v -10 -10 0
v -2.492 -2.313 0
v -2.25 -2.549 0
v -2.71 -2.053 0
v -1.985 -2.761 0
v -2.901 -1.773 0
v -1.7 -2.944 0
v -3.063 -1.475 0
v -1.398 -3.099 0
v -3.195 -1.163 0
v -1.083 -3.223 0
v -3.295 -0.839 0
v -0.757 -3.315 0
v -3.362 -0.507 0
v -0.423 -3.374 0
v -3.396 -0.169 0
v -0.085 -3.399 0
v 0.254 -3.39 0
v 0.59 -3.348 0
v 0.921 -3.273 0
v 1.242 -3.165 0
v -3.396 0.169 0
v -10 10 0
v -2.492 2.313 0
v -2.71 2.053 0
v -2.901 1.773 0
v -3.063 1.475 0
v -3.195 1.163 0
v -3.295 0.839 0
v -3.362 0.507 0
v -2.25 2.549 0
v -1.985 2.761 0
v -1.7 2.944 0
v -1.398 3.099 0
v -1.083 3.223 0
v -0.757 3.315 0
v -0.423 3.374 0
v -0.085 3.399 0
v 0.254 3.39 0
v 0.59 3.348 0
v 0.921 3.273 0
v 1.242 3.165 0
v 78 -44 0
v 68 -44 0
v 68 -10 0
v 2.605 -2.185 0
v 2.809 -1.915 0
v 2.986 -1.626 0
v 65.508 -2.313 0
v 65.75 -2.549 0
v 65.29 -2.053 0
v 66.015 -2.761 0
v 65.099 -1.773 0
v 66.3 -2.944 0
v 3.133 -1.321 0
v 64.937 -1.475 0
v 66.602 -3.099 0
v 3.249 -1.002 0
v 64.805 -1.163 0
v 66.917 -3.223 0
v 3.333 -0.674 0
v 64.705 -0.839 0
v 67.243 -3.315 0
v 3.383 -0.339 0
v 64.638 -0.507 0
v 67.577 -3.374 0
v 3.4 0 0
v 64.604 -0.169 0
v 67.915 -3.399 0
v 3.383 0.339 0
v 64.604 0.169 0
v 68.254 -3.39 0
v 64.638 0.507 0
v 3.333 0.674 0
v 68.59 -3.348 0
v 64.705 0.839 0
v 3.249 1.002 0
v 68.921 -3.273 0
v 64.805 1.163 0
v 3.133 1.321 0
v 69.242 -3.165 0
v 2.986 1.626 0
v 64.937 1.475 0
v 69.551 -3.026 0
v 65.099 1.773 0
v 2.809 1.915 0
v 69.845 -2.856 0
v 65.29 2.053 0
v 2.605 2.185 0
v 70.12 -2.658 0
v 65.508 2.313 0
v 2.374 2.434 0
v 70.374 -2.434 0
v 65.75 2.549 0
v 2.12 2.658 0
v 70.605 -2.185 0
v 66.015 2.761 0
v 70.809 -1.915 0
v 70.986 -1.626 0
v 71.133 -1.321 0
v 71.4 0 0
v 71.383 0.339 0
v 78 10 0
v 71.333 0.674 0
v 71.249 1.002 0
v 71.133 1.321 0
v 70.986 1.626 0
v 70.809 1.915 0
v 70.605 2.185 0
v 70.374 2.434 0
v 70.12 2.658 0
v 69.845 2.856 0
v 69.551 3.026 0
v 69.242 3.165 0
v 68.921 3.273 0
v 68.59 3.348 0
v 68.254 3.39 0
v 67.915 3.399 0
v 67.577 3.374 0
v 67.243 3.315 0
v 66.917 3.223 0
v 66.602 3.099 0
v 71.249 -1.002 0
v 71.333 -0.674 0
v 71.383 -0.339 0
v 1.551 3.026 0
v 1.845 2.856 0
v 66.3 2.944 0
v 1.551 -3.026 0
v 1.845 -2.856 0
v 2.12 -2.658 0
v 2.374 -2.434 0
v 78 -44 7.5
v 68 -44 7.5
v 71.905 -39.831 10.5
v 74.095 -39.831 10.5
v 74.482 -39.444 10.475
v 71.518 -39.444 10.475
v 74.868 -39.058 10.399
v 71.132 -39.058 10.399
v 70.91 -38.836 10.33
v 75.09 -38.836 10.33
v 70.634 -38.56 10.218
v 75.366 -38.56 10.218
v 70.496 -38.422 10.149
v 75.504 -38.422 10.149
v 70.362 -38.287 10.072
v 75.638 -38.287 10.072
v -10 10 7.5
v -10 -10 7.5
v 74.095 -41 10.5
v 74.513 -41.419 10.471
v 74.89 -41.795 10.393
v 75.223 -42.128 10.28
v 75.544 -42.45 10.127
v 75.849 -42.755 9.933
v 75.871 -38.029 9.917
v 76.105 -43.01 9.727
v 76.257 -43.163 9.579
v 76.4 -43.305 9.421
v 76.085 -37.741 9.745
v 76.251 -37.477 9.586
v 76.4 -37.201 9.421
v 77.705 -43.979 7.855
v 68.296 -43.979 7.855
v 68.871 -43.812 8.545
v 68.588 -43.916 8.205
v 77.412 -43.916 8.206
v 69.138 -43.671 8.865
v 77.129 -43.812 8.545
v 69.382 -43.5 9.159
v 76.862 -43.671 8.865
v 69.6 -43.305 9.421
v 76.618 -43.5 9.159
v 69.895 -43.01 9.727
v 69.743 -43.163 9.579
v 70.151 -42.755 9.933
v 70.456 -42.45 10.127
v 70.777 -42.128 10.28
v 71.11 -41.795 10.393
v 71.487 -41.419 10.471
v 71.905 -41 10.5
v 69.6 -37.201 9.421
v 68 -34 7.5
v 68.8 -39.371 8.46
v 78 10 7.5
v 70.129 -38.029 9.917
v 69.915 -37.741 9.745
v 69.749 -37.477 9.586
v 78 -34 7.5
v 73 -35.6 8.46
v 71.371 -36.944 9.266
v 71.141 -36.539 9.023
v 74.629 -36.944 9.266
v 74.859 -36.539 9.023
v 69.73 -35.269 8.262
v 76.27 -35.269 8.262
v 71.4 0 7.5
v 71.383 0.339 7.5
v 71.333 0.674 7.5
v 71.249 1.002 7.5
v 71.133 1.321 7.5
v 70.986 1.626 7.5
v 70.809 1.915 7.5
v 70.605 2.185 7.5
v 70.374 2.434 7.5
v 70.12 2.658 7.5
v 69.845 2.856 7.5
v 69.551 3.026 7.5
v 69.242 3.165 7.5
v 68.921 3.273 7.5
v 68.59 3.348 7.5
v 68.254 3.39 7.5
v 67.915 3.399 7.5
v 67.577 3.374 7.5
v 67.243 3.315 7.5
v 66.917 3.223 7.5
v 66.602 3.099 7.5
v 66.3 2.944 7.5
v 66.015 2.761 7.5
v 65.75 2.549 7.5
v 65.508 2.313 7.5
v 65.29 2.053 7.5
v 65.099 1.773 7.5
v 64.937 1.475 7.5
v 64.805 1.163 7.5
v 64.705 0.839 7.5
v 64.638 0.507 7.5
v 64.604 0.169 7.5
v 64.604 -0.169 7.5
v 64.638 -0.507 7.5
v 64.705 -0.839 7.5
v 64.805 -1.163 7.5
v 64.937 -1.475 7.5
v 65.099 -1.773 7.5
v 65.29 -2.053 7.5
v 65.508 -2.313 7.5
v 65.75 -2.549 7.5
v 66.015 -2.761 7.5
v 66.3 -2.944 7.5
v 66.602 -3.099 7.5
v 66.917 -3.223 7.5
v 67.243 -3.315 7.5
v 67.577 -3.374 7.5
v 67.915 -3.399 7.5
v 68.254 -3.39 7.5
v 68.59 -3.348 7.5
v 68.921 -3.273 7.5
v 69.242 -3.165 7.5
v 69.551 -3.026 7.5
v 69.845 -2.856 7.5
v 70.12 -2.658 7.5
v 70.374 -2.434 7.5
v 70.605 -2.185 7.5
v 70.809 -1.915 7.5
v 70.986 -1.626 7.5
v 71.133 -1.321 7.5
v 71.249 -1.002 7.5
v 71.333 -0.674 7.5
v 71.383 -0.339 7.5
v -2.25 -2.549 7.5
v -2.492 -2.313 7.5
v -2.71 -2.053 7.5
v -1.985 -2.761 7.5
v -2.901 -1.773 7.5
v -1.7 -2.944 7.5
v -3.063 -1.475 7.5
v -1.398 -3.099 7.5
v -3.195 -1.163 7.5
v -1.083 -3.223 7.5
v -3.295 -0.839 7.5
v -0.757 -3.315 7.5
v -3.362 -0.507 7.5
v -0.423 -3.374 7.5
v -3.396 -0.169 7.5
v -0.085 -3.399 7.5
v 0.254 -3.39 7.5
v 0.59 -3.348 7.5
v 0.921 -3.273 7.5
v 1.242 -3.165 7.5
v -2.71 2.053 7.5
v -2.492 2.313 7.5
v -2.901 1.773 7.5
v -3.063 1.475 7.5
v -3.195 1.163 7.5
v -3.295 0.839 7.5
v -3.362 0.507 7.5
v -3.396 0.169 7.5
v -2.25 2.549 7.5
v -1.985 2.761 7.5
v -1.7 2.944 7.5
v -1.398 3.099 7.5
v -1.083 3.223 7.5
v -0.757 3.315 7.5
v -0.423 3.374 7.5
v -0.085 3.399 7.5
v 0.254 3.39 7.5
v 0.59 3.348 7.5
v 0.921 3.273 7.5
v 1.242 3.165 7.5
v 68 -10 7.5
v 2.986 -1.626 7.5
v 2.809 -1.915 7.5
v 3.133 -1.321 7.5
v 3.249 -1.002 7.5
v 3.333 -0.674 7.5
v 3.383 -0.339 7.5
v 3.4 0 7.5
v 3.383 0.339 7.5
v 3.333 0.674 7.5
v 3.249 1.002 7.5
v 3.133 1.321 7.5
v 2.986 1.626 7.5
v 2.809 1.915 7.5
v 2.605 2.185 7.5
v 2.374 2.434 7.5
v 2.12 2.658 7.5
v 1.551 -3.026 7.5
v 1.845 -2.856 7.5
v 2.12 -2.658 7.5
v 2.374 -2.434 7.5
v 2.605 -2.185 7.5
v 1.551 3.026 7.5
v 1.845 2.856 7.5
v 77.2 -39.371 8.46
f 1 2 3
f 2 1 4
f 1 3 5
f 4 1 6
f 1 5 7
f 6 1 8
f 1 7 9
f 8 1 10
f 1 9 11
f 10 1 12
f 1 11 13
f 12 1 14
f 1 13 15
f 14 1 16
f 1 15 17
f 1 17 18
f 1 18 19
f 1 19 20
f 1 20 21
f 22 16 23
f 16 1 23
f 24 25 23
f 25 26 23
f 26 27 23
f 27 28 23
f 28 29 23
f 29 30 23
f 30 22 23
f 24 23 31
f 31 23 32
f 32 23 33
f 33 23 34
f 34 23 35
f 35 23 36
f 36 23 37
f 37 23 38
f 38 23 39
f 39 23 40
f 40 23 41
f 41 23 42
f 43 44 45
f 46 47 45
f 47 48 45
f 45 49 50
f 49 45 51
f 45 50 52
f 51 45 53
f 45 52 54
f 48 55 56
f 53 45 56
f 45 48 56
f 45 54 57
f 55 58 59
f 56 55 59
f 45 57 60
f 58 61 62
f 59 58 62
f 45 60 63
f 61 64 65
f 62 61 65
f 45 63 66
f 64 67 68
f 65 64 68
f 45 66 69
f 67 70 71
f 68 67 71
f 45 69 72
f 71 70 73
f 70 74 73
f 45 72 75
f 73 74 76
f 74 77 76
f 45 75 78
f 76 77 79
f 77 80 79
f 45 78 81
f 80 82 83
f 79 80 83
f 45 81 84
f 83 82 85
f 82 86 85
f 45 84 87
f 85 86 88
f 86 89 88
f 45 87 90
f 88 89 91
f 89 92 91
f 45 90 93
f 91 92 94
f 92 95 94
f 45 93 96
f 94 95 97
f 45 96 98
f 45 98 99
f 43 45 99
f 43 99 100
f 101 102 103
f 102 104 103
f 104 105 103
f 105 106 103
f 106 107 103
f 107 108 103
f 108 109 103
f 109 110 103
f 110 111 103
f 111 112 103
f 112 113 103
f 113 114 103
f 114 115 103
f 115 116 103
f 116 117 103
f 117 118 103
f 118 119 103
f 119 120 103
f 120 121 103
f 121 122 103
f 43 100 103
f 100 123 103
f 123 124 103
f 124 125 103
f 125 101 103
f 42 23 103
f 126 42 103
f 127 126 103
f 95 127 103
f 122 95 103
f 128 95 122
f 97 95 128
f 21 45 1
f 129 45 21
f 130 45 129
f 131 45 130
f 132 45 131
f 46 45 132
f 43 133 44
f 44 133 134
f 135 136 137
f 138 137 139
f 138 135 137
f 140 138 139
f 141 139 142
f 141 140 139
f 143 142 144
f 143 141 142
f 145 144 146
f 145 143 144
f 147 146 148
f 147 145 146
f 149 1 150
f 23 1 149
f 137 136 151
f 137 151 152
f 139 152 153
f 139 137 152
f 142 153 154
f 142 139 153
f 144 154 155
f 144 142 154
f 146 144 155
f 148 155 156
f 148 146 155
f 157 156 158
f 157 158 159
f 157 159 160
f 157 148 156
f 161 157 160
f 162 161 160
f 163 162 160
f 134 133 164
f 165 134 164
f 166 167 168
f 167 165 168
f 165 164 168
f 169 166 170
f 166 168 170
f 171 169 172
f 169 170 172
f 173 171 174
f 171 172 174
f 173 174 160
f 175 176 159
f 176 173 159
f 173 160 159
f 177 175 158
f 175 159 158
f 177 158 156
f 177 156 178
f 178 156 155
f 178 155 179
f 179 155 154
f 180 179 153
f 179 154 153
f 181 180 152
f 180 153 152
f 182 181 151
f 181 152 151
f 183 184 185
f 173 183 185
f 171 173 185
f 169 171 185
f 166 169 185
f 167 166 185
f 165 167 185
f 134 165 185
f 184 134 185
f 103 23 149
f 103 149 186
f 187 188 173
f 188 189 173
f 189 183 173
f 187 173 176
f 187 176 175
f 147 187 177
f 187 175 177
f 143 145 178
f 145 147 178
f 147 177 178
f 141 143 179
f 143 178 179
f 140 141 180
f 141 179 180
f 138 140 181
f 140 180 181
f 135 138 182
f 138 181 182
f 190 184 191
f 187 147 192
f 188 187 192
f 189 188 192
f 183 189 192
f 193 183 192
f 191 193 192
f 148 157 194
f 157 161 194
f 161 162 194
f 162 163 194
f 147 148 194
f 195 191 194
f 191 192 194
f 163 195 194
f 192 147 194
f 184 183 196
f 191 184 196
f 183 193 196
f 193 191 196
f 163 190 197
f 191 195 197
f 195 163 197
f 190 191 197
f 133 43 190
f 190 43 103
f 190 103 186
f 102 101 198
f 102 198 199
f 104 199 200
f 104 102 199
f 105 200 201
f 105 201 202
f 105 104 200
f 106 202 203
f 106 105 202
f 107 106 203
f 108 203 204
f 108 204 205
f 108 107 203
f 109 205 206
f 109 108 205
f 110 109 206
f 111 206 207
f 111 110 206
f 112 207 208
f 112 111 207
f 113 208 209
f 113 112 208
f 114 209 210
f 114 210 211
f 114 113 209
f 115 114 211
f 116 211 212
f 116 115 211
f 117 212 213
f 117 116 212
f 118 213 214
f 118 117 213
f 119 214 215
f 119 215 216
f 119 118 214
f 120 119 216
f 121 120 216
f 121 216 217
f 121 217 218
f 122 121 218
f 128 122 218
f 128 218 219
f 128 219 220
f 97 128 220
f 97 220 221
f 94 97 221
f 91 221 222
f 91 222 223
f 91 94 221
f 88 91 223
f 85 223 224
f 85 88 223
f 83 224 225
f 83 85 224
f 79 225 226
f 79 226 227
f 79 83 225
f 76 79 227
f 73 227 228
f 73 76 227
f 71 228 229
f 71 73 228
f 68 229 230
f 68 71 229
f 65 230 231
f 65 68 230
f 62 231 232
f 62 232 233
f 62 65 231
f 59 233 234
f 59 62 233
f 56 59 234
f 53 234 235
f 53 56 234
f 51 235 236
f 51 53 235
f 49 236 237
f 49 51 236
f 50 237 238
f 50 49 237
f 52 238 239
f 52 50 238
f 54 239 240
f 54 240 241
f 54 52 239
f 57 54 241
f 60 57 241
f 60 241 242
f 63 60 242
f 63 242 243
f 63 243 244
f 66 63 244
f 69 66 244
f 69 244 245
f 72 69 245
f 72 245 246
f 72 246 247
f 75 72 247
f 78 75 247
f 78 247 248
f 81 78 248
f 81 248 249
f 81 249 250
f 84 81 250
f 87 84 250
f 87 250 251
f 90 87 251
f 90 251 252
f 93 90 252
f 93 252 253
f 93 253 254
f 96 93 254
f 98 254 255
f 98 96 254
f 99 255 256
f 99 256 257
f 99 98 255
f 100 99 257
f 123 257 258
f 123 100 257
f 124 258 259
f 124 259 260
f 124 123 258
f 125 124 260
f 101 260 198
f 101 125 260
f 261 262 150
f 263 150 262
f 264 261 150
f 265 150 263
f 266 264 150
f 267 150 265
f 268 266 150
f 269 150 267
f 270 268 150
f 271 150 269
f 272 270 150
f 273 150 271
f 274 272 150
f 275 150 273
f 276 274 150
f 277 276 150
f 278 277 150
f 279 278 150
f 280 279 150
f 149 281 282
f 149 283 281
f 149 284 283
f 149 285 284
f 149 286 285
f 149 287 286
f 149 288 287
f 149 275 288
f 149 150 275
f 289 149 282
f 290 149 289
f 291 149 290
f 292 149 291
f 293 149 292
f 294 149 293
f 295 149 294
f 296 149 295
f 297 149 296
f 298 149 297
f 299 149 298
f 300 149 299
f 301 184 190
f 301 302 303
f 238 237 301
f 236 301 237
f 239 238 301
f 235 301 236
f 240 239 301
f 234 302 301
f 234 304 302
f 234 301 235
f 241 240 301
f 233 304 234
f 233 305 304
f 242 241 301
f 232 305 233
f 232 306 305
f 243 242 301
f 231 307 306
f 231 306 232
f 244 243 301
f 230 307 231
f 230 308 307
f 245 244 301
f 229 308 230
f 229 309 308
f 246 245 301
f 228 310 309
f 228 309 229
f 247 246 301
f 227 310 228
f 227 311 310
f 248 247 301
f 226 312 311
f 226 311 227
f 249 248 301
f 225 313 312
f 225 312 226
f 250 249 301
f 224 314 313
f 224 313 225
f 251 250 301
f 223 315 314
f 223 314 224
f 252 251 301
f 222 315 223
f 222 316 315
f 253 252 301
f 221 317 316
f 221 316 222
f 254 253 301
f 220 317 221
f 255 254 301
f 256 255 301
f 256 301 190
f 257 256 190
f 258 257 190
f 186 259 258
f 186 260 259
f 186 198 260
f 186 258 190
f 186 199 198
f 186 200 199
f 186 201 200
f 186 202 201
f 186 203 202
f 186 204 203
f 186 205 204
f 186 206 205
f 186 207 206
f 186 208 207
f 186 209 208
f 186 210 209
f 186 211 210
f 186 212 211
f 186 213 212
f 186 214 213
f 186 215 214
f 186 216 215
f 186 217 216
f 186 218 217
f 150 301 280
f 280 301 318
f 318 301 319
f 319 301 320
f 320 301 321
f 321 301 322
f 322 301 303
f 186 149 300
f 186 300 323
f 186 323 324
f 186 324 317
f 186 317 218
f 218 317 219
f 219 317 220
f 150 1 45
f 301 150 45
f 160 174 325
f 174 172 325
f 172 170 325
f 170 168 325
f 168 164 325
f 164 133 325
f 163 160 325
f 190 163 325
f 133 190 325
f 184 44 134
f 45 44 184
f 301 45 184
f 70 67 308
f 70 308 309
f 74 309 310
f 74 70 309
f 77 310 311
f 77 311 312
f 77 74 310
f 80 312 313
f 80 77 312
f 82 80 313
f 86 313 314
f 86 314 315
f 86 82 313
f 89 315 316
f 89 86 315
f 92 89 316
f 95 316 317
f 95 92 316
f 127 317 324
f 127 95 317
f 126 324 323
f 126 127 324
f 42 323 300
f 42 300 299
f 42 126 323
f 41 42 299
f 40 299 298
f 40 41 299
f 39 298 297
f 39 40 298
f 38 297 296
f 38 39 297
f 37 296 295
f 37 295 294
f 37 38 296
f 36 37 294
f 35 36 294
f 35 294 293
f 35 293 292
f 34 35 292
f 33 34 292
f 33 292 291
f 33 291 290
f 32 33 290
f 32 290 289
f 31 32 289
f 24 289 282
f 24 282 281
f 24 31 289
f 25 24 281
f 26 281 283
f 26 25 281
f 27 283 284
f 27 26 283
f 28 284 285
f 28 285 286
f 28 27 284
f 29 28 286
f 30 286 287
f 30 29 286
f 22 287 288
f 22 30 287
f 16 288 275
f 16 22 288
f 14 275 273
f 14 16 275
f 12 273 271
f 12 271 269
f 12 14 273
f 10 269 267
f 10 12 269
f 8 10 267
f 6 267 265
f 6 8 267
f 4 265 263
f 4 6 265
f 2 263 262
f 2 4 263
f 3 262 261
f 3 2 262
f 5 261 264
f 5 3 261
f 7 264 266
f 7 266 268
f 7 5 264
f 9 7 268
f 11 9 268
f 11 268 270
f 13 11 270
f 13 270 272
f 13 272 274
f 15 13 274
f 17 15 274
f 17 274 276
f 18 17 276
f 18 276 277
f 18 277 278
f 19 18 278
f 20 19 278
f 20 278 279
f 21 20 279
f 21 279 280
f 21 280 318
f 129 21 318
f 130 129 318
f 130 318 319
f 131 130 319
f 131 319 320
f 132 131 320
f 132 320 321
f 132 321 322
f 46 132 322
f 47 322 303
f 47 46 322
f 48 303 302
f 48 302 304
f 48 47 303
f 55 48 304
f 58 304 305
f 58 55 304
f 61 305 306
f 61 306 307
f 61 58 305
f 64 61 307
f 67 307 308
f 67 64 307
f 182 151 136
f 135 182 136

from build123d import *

# Parameters (mm, degrees)
SKETCH1_W           = 88
SKETCH1_H           = 20
SKETCH1_R           = 3.4
BOSS_EXTRUDE1_DEPTH = 7.5
SKETCH2_W           = 10
SKETCH2_H           = 7.5
BOSS_EXTRUDE2_DEPTH = 34
FILLET1_R           = 3


with BuildPart() as part:
    # Sketch1 → Boss-Extrude1 (new body)
    with BuildSketch(Plane.XY):
        with Locations((34, 0)):
            Rectangle(SKETCH1_W, SKETCH1_H)
        Circle(SKETCH1_R, mode=Mode.SUBTRACT)
        with Locations((68, 0)):
            Circle(SKETCH1_R, mode=Mode.SUBTRACT)
    extrude(amount=BOSS_EXTRUDE1_DEPTH)

    # Sketch2 → Boss-Extrude2 (add)
    with BuildSketch(Plane.XZ.offset(10)):
        with Locations((73, 3.75)):
            Rectangle(SKETCH2_W, SKETCH2_H)
    extrude(amount=BOSS_EXTRUDE2_DEPTH)

    # Sketch4 → Loft1 section 0
    with BuildSketch(Plane.XY.offset(7.5)):
        with BuildLine():
            Line((78, -44), (68, -44))
            Line((68, -44), (68, -34))
            Line((68, -34), (78, -34))
            Line((78, -34), (78, -44))
        make_face()
    # Sketch3 → Loft1 section 1
    with BuildSketch(Plane.XY.offset(10.5)):
        with BuildLine():
            Line((75.5, -39), (70.5, -39))
            Line((70.5, -39), (70.5, -44))
            Line((70.5, -44), (75.5, -44))
            Line((75.5, -44), (75.5, -39))
        make_face()
    loft()

    # Fillet1
    fillet1_edges = [part.edges().sort_by_distance(p)[0] for p in [
        (73, -39, 10.5),
        (75.5, -41.5, 10.5),
        (73, -44, 10.5),
        (70.5, -41.5, 10.5),
    ]]
    fillet(fillet1_edges, radius=FILLET1_R - 0.0001)  # a hair under: the kernel refuses the full size


solid = part.part
